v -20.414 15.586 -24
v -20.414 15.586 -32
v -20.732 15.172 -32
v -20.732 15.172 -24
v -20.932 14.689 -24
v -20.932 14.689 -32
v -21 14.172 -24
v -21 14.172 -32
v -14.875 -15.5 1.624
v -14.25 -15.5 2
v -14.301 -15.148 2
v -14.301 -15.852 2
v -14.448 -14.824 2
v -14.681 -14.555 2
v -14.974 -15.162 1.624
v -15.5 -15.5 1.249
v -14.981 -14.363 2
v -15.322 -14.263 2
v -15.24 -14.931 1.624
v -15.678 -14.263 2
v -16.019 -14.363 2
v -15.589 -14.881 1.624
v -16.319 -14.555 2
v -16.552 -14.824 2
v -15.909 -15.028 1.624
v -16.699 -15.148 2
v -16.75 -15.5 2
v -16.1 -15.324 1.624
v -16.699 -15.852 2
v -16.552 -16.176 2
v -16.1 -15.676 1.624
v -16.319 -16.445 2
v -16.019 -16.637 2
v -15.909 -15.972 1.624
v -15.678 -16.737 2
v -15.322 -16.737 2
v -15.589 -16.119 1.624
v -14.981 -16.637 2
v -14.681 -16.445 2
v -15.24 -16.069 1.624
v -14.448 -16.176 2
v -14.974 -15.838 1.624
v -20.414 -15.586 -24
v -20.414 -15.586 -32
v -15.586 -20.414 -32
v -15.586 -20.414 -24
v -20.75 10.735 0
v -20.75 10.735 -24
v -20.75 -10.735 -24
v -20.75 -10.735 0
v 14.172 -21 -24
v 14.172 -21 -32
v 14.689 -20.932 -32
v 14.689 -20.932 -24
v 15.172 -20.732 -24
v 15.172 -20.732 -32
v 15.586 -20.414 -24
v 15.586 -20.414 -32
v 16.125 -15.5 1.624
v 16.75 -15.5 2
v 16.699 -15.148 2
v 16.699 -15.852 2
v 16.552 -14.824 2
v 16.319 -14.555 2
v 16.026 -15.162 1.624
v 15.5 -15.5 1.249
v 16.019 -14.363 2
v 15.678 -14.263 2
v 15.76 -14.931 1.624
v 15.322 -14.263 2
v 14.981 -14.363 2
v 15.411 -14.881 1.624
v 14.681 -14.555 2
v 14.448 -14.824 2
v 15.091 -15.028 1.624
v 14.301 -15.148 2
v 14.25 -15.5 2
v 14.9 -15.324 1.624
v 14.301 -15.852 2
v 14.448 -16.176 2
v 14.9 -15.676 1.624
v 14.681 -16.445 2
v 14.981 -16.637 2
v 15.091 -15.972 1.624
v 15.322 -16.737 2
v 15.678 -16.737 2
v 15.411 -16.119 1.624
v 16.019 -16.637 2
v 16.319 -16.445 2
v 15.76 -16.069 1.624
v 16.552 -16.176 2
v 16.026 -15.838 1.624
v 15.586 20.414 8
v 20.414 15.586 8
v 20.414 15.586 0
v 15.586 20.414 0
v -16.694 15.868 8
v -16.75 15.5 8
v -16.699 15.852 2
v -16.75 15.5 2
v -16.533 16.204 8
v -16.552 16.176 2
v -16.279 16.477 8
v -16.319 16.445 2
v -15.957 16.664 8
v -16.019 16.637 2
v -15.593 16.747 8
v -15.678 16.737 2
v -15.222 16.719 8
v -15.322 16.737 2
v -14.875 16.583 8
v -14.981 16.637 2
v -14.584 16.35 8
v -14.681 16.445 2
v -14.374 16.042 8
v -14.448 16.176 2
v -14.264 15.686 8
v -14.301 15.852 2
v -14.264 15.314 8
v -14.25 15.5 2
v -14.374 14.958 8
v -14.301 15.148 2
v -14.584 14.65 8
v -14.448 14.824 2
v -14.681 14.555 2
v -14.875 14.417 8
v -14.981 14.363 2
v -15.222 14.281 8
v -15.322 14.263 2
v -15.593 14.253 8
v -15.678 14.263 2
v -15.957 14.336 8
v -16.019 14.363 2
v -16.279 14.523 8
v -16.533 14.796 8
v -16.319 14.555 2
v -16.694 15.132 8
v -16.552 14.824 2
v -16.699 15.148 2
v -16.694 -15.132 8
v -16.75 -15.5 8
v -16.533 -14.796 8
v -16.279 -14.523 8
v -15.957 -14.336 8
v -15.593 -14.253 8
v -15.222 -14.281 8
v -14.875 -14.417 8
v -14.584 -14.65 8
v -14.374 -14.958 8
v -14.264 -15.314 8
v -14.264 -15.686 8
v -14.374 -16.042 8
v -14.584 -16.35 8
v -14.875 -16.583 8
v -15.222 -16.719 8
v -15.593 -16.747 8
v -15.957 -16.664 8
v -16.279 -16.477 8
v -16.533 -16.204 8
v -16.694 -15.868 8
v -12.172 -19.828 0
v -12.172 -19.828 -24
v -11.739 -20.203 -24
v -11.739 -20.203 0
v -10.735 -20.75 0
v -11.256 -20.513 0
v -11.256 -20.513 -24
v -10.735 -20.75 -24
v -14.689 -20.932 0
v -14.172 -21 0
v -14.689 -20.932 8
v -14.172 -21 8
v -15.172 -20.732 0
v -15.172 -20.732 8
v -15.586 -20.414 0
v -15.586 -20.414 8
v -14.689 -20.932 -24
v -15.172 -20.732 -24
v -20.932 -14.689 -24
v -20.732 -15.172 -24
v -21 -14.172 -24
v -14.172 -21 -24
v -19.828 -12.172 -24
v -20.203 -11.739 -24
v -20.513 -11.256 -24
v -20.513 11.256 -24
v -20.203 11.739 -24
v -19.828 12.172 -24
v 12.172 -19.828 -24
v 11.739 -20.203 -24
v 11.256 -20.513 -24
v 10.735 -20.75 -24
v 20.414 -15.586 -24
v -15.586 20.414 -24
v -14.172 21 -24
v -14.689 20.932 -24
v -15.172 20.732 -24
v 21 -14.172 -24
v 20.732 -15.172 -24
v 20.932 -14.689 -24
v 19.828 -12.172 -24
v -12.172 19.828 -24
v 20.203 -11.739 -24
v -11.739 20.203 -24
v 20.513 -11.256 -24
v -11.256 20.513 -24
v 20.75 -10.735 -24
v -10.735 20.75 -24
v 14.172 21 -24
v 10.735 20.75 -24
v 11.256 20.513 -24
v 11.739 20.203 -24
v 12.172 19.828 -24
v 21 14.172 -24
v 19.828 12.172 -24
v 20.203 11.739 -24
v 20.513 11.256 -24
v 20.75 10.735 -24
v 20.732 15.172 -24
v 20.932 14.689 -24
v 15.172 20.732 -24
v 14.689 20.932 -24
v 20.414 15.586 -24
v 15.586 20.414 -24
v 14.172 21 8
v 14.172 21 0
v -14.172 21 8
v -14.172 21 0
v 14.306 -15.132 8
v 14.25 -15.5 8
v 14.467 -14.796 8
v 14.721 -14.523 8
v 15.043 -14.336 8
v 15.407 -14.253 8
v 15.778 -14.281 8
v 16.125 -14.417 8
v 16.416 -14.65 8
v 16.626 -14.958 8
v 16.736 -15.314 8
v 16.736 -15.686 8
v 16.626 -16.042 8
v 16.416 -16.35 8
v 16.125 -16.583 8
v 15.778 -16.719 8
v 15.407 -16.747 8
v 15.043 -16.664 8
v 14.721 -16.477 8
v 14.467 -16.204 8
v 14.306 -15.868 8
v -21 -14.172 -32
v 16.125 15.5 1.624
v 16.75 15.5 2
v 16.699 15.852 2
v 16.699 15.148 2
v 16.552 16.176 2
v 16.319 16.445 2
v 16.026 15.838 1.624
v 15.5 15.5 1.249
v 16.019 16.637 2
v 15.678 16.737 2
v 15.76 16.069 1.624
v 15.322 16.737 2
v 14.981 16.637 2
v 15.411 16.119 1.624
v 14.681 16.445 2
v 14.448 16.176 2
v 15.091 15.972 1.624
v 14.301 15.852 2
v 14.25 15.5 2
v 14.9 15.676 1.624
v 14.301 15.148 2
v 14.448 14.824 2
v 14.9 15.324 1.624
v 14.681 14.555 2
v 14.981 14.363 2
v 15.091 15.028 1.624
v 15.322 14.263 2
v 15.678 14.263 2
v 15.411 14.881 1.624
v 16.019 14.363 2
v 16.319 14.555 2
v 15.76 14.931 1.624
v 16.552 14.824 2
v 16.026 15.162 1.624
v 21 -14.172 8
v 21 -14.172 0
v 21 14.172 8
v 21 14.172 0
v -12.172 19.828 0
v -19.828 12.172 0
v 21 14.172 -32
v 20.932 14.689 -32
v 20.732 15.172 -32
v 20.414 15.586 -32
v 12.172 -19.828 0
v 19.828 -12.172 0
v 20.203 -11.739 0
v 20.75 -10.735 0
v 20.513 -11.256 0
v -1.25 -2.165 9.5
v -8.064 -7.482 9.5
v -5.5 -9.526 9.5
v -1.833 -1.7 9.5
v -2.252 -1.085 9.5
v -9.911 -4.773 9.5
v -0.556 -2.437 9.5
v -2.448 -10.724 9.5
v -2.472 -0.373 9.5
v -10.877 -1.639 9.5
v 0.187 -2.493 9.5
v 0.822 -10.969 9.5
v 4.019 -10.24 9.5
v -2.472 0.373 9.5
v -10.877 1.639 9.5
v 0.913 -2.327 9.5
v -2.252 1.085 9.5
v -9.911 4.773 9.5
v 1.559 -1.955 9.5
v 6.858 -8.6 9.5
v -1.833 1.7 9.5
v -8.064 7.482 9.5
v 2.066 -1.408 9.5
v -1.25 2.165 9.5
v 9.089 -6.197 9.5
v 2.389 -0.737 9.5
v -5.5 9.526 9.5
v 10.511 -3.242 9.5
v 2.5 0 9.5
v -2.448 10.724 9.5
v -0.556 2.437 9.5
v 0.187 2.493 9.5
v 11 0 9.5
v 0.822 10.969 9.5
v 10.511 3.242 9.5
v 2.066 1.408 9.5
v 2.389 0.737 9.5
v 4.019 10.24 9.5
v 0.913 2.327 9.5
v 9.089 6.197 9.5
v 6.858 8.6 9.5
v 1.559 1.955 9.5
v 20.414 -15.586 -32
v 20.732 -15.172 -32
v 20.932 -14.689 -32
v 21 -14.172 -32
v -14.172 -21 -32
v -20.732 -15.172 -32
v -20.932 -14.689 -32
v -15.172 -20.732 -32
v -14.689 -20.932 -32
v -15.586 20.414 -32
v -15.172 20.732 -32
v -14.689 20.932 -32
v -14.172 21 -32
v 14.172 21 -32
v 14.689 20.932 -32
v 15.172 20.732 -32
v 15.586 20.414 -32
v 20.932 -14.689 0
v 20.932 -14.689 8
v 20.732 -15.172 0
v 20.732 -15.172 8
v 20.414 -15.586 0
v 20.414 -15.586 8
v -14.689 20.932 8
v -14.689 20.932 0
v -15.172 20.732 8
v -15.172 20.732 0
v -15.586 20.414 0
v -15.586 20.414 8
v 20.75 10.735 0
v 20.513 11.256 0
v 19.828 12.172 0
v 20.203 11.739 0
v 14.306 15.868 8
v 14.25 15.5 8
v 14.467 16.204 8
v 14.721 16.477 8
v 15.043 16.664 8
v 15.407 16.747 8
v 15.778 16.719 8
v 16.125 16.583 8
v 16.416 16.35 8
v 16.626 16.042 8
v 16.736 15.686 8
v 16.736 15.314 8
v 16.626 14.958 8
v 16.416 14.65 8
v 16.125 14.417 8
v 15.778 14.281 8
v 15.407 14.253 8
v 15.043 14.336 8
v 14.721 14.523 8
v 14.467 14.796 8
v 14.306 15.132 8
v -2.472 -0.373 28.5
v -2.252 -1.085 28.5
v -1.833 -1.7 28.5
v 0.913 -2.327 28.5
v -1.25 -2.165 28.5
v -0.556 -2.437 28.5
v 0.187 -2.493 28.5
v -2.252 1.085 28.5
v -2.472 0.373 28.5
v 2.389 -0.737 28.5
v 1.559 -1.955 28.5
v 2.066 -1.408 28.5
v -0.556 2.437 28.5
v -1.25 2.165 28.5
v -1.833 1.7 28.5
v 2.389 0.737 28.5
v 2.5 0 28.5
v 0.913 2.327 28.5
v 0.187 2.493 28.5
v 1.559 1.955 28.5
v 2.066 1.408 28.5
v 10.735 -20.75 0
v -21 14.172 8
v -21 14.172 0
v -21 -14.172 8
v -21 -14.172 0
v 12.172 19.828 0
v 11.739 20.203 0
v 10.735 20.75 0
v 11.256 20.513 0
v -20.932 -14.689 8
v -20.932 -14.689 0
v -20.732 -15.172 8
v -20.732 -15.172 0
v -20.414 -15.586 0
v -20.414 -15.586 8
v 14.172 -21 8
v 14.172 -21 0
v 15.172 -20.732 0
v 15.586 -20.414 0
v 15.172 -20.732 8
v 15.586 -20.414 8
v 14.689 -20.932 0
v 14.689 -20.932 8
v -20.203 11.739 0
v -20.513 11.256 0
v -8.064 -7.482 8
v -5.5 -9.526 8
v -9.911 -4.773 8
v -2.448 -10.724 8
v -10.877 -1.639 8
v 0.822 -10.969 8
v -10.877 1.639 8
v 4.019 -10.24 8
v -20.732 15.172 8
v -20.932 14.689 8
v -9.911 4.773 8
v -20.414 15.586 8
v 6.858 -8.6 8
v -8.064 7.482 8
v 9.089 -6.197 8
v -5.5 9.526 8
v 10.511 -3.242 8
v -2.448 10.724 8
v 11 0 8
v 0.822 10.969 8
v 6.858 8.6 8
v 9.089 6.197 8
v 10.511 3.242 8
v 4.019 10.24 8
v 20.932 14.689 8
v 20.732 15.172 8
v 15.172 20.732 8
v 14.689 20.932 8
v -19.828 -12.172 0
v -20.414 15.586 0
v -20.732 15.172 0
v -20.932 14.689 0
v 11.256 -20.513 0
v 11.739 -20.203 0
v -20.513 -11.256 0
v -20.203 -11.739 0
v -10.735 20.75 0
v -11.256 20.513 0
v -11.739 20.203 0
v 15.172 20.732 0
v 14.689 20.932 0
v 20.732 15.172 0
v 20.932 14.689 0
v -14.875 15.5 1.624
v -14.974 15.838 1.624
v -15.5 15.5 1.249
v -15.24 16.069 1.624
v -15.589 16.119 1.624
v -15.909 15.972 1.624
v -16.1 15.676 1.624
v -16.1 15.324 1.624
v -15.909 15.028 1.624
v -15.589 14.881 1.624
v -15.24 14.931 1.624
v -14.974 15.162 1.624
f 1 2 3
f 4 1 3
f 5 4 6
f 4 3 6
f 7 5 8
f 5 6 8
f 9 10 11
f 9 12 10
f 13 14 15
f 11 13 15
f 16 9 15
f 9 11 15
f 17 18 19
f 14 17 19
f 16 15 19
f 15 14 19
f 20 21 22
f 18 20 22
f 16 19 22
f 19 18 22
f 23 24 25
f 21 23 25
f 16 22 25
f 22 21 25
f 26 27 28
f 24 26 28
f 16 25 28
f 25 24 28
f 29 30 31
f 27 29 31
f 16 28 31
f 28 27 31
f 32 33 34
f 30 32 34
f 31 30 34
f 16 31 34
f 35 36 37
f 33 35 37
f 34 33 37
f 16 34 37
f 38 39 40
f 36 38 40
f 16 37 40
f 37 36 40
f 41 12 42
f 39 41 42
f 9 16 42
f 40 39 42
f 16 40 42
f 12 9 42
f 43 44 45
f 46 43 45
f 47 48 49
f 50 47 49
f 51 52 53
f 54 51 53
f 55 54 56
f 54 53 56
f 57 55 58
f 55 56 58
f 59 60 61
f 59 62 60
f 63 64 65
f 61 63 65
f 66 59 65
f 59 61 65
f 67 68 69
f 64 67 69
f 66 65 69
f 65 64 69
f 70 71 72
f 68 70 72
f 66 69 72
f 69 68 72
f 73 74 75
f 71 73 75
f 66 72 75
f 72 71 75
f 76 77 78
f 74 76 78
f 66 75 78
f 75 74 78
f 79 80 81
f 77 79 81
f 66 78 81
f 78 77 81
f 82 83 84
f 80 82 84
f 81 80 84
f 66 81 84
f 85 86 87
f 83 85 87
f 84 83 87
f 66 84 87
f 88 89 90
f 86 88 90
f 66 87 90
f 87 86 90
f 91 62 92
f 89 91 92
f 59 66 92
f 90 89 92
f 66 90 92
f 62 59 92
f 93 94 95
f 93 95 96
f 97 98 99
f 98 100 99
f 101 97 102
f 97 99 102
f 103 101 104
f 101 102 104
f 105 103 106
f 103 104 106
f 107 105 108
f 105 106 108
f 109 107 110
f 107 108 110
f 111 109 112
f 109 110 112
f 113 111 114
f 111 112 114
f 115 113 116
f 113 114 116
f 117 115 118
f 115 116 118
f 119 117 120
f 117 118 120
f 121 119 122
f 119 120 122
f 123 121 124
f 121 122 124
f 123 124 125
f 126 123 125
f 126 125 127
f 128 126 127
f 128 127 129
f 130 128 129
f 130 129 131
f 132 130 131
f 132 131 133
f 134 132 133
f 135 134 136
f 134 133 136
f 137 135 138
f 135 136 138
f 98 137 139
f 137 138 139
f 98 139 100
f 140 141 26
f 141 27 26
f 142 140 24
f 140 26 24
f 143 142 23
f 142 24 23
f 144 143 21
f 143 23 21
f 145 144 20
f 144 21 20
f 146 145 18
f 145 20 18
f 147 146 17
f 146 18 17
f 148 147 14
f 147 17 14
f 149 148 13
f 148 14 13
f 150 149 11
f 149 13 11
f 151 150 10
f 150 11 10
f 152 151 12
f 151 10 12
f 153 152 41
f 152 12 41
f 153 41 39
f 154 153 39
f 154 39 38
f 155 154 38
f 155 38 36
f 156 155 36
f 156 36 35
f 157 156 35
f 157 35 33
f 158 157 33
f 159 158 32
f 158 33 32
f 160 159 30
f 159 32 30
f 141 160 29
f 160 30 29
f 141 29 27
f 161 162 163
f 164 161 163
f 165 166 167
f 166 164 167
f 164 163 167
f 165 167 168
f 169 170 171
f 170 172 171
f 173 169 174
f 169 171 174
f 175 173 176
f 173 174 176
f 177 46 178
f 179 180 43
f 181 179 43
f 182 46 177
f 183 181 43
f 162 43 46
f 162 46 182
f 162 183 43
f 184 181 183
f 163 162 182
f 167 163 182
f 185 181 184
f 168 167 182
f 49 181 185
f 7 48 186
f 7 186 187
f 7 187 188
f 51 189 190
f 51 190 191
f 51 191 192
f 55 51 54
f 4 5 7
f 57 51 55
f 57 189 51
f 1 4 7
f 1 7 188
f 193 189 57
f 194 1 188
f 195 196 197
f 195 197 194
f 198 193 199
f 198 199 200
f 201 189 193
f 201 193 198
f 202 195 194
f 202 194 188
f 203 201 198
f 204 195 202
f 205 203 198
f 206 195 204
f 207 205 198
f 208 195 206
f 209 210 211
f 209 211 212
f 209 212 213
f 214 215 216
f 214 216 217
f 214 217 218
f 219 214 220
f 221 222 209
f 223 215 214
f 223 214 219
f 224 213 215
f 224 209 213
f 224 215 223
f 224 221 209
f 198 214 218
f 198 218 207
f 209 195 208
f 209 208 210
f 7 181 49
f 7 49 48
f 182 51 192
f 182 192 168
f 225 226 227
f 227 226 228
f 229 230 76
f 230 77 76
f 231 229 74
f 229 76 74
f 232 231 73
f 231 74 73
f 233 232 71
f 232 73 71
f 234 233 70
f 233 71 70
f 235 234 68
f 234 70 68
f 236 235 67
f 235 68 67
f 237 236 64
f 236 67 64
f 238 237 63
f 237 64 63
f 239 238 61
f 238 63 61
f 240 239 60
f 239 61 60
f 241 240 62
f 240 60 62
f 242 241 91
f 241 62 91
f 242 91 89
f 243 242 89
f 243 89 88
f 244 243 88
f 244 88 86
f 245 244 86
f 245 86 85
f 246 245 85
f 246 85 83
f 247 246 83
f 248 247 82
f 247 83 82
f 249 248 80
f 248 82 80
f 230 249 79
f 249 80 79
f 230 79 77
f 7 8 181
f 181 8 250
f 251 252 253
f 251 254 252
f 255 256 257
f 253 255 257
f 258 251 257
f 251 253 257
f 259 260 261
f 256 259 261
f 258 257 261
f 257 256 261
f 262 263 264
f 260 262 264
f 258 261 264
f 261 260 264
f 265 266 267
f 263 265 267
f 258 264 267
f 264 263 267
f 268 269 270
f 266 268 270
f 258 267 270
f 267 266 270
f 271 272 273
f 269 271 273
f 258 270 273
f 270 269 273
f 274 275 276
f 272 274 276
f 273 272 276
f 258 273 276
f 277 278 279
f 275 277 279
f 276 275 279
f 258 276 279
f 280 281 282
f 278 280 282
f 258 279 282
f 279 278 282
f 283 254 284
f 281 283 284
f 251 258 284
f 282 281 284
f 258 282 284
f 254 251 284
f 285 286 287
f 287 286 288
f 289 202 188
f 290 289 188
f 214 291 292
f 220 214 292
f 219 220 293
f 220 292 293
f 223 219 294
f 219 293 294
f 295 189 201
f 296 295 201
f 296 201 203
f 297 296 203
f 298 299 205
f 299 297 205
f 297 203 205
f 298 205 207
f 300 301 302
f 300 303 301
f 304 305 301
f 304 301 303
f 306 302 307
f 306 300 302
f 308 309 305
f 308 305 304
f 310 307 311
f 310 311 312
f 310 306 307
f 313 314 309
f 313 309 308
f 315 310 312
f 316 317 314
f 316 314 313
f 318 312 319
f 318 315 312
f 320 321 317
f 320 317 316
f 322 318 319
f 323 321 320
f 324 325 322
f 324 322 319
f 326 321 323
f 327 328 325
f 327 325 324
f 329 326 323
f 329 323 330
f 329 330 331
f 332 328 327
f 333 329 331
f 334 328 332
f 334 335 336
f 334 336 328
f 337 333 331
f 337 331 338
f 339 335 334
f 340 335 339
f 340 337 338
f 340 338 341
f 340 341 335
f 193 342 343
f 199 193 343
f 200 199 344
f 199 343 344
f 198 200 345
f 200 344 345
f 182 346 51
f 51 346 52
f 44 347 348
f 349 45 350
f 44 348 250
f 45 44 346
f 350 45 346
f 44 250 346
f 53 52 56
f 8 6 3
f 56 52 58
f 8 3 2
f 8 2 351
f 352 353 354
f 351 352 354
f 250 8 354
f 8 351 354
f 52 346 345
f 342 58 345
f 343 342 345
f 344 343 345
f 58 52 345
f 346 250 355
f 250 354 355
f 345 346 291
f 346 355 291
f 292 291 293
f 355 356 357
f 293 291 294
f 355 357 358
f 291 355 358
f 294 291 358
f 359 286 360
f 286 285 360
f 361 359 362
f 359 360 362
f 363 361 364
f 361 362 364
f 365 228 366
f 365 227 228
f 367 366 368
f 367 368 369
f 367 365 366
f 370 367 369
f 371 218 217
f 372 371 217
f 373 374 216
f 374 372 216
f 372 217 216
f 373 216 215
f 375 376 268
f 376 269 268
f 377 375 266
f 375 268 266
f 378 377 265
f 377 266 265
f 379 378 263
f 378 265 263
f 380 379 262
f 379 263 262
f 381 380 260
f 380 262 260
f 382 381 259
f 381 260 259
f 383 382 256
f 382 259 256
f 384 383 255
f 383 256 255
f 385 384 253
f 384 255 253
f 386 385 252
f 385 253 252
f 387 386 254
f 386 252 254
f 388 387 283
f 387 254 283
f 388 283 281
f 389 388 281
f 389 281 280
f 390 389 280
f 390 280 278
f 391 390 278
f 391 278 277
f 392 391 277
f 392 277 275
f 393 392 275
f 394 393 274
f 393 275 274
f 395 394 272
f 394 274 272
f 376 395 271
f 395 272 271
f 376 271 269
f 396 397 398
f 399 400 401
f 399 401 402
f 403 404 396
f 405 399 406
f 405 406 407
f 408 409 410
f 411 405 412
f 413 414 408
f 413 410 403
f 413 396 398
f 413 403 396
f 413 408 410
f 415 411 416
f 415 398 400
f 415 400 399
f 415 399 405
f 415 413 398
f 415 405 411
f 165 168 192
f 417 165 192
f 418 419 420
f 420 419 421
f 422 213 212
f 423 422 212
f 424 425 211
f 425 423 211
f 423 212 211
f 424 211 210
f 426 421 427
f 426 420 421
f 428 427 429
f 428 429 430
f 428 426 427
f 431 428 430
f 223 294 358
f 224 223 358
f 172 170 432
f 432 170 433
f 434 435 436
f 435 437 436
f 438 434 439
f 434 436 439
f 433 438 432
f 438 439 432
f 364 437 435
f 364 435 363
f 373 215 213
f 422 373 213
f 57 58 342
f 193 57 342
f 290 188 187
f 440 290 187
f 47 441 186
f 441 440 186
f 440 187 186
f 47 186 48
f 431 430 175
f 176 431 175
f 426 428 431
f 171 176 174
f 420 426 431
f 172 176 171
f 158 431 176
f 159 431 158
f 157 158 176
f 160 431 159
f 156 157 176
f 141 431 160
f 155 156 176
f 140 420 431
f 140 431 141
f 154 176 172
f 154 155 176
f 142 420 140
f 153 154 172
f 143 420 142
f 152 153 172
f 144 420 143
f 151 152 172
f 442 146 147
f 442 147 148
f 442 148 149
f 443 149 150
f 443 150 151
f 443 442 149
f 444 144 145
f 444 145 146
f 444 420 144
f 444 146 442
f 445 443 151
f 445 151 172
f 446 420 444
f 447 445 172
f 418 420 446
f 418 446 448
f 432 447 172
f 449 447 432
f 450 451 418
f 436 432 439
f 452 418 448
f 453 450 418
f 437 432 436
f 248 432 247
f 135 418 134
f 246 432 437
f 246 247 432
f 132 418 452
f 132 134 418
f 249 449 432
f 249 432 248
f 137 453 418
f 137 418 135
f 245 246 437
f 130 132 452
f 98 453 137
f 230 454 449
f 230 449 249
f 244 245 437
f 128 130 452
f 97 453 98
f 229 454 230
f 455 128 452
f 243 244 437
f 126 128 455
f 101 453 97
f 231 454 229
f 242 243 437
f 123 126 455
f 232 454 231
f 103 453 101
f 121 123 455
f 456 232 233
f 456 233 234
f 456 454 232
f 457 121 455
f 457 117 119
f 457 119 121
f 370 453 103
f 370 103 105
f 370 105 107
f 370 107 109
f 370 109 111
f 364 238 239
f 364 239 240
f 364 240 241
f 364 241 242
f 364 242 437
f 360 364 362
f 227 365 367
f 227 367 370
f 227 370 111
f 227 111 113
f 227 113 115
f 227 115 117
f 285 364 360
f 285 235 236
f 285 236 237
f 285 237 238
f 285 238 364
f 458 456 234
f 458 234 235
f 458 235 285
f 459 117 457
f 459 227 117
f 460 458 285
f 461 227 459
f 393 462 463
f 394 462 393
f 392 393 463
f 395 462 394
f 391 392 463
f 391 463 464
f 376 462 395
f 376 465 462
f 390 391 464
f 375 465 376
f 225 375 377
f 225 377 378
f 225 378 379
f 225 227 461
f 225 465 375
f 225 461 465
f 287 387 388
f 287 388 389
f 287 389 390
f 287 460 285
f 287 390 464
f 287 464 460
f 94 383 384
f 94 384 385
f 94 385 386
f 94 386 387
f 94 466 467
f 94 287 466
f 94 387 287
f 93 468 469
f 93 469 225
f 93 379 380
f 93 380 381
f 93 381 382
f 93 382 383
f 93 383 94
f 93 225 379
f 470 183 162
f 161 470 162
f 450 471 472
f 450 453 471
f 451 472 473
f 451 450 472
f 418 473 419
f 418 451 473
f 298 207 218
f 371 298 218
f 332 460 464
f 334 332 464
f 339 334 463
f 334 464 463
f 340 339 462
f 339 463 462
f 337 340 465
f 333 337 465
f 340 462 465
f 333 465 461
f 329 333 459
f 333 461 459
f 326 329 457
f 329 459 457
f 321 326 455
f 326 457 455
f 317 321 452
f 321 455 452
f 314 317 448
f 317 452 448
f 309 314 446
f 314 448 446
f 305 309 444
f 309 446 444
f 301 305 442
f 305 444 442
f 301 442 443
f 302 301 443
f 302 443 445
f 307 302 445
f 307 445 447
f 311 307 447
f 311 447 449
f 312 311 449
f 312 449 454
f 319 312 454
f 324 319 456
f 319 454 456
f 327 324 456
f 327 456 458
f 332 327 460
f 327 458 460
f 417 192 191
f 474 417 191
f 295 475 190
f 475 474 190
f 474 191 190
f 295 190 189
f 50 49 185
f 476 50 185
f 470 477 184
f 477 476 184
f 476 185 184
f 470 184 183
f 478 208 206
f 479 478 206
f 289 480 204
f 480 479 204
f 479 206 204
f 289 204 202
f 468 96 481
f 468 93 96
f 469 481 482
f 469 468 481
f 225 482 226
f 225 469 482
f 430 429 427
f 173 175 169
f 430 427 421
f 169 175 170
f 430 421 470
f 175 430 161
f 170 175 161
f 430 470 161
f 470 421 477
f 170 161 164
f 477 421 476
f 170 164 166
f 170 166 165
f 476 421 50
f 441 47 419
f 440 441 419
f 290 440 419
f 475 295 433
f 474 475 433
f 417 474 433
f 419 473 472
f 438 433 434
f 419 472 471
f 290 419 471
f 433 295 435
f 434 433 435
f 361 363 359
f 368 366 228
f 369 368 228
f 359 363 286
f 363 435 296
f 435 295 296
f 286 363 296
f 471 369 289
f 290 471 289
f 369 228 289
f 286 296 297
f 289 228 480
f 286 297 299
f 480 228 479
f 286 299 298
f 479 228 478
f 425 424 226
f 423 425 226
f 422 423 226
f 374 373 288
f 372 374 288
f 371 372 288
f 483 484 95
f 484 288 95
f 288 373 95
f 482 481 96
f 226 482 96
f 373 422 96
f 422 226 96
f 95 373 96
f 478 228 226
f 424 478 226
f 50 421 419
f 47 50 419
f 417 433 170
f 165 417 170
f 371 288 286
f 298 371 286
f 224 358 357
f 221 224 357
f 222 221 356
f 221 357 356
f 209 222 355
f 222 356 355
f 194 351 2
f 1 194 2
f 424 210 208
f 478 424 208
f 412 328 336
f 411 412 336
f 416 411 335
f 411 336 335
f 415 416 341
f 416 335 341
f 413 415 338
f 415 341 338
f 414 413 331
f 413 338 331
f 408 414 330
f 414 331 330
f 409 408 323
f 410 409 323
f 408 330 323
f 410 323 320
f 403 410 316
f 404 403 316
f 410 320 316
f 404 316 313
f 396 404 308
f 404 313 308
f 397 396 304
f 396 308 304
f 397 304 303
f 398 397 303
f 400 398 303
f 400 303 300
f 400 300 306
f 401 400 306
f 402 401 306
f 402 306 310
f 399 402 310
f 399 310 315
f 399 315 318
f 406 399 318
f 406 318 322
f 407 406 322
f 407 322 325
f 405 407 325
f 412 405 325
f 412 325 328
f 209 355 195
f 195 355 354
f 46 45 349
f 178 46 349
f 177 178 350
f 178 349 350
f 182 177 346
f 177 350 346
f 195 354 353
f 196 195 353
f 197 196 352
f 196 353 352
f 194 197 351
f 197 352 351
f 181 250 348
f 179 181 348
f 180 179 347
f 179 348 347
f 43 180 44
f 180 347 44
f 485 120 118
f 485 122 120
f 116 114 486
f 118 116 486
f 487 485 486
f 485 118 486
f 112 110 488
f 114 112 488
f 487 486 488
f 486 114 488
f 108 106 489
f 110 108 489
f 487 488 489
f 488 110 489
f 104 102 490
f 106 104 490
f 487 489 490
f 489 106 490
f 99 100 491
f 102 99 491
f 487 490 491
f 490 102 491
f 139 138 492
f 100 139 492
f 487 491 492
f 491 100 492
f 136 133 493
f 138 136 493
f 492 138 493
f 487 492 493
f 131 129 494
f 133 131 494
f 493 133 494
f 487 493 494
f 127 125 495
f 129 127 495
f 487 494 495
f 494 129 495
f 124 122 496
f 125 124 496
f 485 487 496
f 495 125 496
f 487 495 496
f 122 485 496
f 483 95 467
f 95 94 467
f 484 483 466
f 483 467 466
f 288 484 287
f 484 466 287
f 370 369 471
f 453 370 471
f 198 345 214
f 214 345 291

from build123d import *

# Parameters (mm, degrees)
EXTRUDE_START               = -40
EXTRUDE_2_DEPTH             = 40
EXTRUDE_START_2             = -8
EXTRUDE_2_2_DEPTH           = 8
EXTRUDE_2_3_DEPTH           = 8
EXTRUDE_2_4_OUTLINE_R       = 2.5
EXTRUDE_2_4_DEPTH           = 20.5
FILLET_1_R                  = 2
HOLE_WIZARD_2_5_2_5_1_D     = 2.5
HOLE_WIZARD_2_5_2_5_1_DEPTH = 6
HOLE_WIZARD_2_5_2_5_1_TIP   = 0.751075774
HOLE_WIZARD_2_5_2_5_2_D     = 2.5
HOLE_WIZARD_2_5_2_5_2_DEPTH = 6
HOLE_WIZARD_2_5_2_5_2_TIP   = 0.751075774
HOLE_WIZARD_2_5_2_5_3_D     = 2.5
HOLE_WIZARD_2_5_2_5_3_DEPTH = 6
HOLE_WIZARD_2_5_2_5_3_TIP   = 0.751075774
HOLE_WIZARD_2_5_2_5_4_D     = 2.5
HOLE_WIZARD_2_5_2_5_4_DEPTH = 6
HOLE_WIZARD_2_5_2_5_4_TIP   = 0.751075774
SKETCH_15_R                 = 11
SKETCH_15_R_2               = 2
EXTRUDE_3_DEPTH             = 1.5


with BuildPart() as part:
    # Бобышка-Вытянуть2: read off the stored shape, not the designer's step
    # Бобышка-Вытянуть2 outline → Бобышка-Вытянуть2 (new body)
    with BuildSketch(Plane.XY.offset(8).offset(EXTRUDE_START)):
        with BuildLine():
            ThreePointArc((19.828427125, -12.171572875), (20.366719307, -11.503053413), (20.75, -10.735086841))
            Line((20.75, -10.735086841), (20.75, 10.735086841))
            ThreePointArc((20.75, 10.735086841), (20.366719307, 11.503053413), (19.828427125, 12.171572875))
            Line((19.828427125, 12.171572875), (12.171572875, 19.828427125))
            ThreePointArc((12.171572875, 19.828427125), (11.503053413, 20.366719307), (10.735086841, 20.75))
            Line((10.735086841, 20.75), (-10.735086841, 20.75))
            ThreePointArc((-10.735086841, 20.75), (-11.503053413, 20.366719307), (-12.171572875, 19.828427125))
            Line((-12.171572875, 19.828427125), (-19.828427125, 12.171572875))
            ThreePointArc((-19.828427125, 12.171572875), (-20.366719307, 11.503053413), (-20.75, 10.735086841))
            Line((-20.75, 10.735086841), (-20.75, -10.735086841))
            ThreePointArc((-20.75, -10.735086841), (-20.366719307, -11.503053413), (-19.828427125, -12.171572875))
            Line((-19.828427125, -12.171572875), (-12.171572875, -19.828427125))
            ThreePointArc((-12.171572875, -19.828427125), (-11.503053413, -20.366719307), (-10.735086841, -20.75))
            Line((-10.735086841, -20.75), (10.735086841, -20.75))
            ThreePointArc((10.735086841, -20.75), (11.503053413, -20.366719307), (12.171572875, -19.828427125))
            Line((12.171572875, -19.828427125), (19.828427125, -12.171572875))
        make_face()
    extrude(amount=EXTRUDE_2_DEPTH)

    # Extrude 2 2 outline → Extrude 2 2 (add)
    with BuildSketch(Plane.XY.offset(8).offset(EXTRUDE_START_2)):
        Polygon((21, 15), (15, 21), (-15, 21), (-21, 15), (-21, -15), (-15, -21), (15, -21), (21, -15), align=None)
        with BuildLine():
            ThreePointArc((20.75, -10.735086841), (20.366719307, -11.503053413), (19.828427125, -12.171572875))
            Line((19.828427125, -12.171572875), (12.171572875, -19.828427125))
            ThreePointArc((12.171572875, -19.828427125), (11.503053413, -20.366719307), (10.735086841, -20.75))
            Line((10.735086841, -20.75), (-10.735086841, -20.75))
            ThreePointArc((-10.735086841, -20.75), (-11.503053413, -20.366719307), (-12.171572875, -19.828427125))
            Line((-12.171572875, -19.828427125), (-19.828427125, -12.171572875))
            ThreePointArc((-19.828427125, -12.171572875), (-20.366719307, -11.503053413), (-20.75, -10.735086841))
            Line((-20.75, -10.735086841), (-20.75, 10.735086841))
            ThreePointArc((-20.75, 10.735086841), (-20.366719307, 11.503053413), (-19.828427125, 12.171572875))
            Line((-19.828427125, 12.171572875), (-12.171572875, 19.828427125))
            ThreePointArc((-12.171572875, 19.828427125), (-11.503053413, 20.366719307), (-10.735086841, 20.75))
            Line((-10.735086841, 20.75), (10.735086841, 20.75))
            ThreePointArc((10.735086841, 20.75), (11.503053413, 20.366719307), (12.171572875, 19.828427125))
            Line((12.171572875, 19.828427125), (19.828427125, 12.171572875))
            ThreePointArc((19.828427125, 12.171572875), (20.366719307, 11.503053413), (20.75, 10.735086841))
            Line((20.75, 10.735086841), (20.75, -10.735086841))
        make_face(mode=Mode.SUBTRACT)
    extrude(amount=EXTRUDE_2_2_DEPTH)

    # Extrude 2 3 outline → Extrude 2 3 (add)
    with BuildSketch(Plane.XY.offset(8).offset(EXTRUDE_START)):
        with BuildLine():
            Line((21, -14.171572875), (21, 14.171572875))
            ThreePointArc((21, 14.171572875), (20.847759065, 14.93693974), (20.414213562, 15.585786438))
            Line((20.414213562, 15.585786438), (15.585786438, 20.414213562))
            ThreePointArc((15.585786438, 20.414213562), (14.93693974, 20.847759065), (14.171572875, 21))
            Line((14.171572875, 21), (-14.171572875, 21))
            ThreePointArc((-14.171572875, 21), (-14.93693974, 20.847759065), (-15.585786438, 20.414213562))
            Line((-15.585786438, 20.414213562), (-20.414213562, 15.585786438))
            ThreePointArc((-20.414213562, 15.585786438), (-20.847759065, 14.93693974), (-21, 14.171572875))
            Line((-21, 14.171572875), (-21, -14.171572875))
            ThreePointArc((-21, -14.171572875), (-20.847759065, -14.93693974), (-20.414213562, -15.585786438))
            Line((-20.414213562, -15.585786438), (-15.585786438, -20.414213562))
            ThreePointArc((-15.585786438, -20.414213562), (-14.93693974, -20.847759065), (-14.171572875, -21))
            Line((-14.171572875, -21), (14.171572875, -21))
            ThreePointArc((14.171572875, -21), (14.93693974, -20.847759065), (15.585786438, -20.414213562))
            Line((15.585786438, -20.414213562), (20.414213562, -15.585786438))
            ThreePointArc((20.414213562, -15.585786438), (20.847759065, -14.93693974), (21, -14.171572875))
        make_face()
        with BuildLine():
            Line((20.75, 10.735086841), (20.75, -10.735086841))
            ThreePointArc((20.75, -10.735086841), (20.366719307, -11.503053413), (19.828427125, -12.171572875))
            Line((19.828427125, -12.171572875), (12.171572875, -19.828427125))
            ThreePointArc((12.171572875, -19.828427125), (11.503053413, -20.366719307), (10.735086841, -20.75))
            Line((10.735086841, -20.75), (-10.735086841, -20.75))
            ThreePointArc((-10.735086841, -20.75), (-11.503053413, -20.366719307), (-12.171572875, -19.828427125))
            Line((-12.171572875, -19.828427125), (-19.828427125, -12.171572875))
            ThreePointArc((-19.828427125, -12.171572875), (-20.366719307, -11.503053413), (-20.75, -10.735086841))
            Line((-20.75, -10.735086841), (-20.75, 10.735086841))
            ThreePointArc((-20.75, 10.735086841), (-20.366719307, 11.503053413), (-19.828427125, 12.171572875))
            Line((-19.828427125, 12.171572875), (-12.171572875, 19.828427125))
            ThreePointArc((-12.171572875, 19.828427125), (-11.503053413, 20.366719307), (-10.735086841, 20.75))
            Line((-10.735086841, 20.75), (10.735086841, 20.75))
            ThreePointArc((10.735086841, 20.75), (11.503053413, 20.366719307), (12.171572875, 19.828427125))
            Line((12.171572875, 19.828427125), (19.828427125, 12.171572875))
            ThreePointArc((19.828427125, 12.171572875), (20.366719307, 11.503053413), (20.75, 10.735086841))
        make_face(mode=Mode.SUBTRACT)
    extrude(amount=EXTRUDE_2_3_DEPTH)

    # Extrude 2 4 outline → Extrude 2 4 (add)
    with BuildSketch(Plane.XY.offset(8)):
        Circle(EXTRUDE_2_4_OUTLINE_R)
    extrude(amount=EXTRUDE_2_4_DEPTH)

    # Скругление1
    fillet_1_edges = [part.edges().sort_by_distance(p)[0] for p in [
        (15, -21, 4),
        (-15, -21, 4),
        (-21, -15, 4),
        (15, 21, 4),
        (21, -15, 4),
        (-15, 21, 4),
        (21, 15, 4),
        (-21, 15, 4),
    ]]
    fillet(fillet_1_edges, radius=FILLET_1_R)

    # Диаметр отверстия Ø2.5 (2.5)1
    with Locations(Plane.XY.offset(8)):
        with Locations((-15.5, 15.5)):
            Hole(HOLE_WIZARD_2_5_2_5_1_D / 2, depth=HOLE_WIZARD_2_5_2_5_1_DEPTH)
            with Locations((0, 0, -(HOLE_WIZARD_2_5_2_5_1_DEPTH + HOLE_WIZARD_2_5_2_5_1_TIP / 2))):  # 118° drill point
                Cone(0, HOLE_WIZARD_2_5_2_5_1_D / 2, HOLE_WIZARD_2_5_2_5_1_TIP, mode=Mode.SUBTRACT)

    # Диаметр отверстия Ø2.5 (2.5)2
    with Locations(Plane.XY.offset(8)):
        with Locations((15.5, 15.5)):
            Hole(HOLE_WIZARD_2_5_2_5_2_D / 2, depth=HOLE_WIZARD_2_5_2_5_2_DEPTH)
            with Locations((0, 0, -(HOLE_WIZARD_2_5_2_5_2_DEPTH + HOLE_WIZARD_2_5_2_5_2_TIP / 2))):  # 118° drill point
                Cone(0, HOLE_WIZARD_2_5_2_5_2_D / 2, HOLE_WIZARD_2_5_2_5_2_TIP, mode=Mode.SUBTRACT)

    # Диаметр отверстия Ø2.5 (2.5)3
    with Locations(Plane.XY.offset(8)):
        with Locations((-15.5, -15.5)):
            Hole(HOLE_WIZARD_2_5_2_5_3_D / 2, depth=HOLE_WIZARD_2_5_2_5_3_DEPTH)
            with Locations((0, 0, -(HOLE_WIZARD_2_5_2_5_3_DEPTH + HOLE_WIZARD_2_5_2_5_3_TIP / 2))):  # 118° drill point
                Cone(0, HOLE_WIZARD_2_5_2_5_3_D / 2, HOLE_WIZARD_2_5_2_5_3_TIP, mode=Mode.SUBTRACT)

    # Диаметр отверстия Ø2.5 (2.5)4
    with Locations(Plane.XY.offset(8)):
        with Locations((15.5, -15.5)):
            Hole(HOLE_WIZARD_2_5_2_5_4_D / 2, depth=HOLE_WIZARD_2_5_2_5_4_DEPTH)
            with Locations((0, 0, -(HOLE_WIZARD_2_5_2_5_4_DEPTH + HOLE_WIZARD_2_5_2_5_4_TIP / 2))):  # 118° drill point
                Cone(0, HOLE_WIZARD_2_5_2_5_4_D / 2, HOLE_WIZARD_2_5_2_5_4_TIP, mode=Mode.SUBTRACT)

    # Эскиз15 → Бобышка-Вытянуть3 (add)
    with BuildSketch(Plane.XY.offset(8)):
        Circle(SKETCH_15_R)
        Circle(SKETCH_15_R_2, mode=Mode.SUBTRACT)
    extrude(amount=EXTRUDE_3_DEPTH)


solid = part.part
